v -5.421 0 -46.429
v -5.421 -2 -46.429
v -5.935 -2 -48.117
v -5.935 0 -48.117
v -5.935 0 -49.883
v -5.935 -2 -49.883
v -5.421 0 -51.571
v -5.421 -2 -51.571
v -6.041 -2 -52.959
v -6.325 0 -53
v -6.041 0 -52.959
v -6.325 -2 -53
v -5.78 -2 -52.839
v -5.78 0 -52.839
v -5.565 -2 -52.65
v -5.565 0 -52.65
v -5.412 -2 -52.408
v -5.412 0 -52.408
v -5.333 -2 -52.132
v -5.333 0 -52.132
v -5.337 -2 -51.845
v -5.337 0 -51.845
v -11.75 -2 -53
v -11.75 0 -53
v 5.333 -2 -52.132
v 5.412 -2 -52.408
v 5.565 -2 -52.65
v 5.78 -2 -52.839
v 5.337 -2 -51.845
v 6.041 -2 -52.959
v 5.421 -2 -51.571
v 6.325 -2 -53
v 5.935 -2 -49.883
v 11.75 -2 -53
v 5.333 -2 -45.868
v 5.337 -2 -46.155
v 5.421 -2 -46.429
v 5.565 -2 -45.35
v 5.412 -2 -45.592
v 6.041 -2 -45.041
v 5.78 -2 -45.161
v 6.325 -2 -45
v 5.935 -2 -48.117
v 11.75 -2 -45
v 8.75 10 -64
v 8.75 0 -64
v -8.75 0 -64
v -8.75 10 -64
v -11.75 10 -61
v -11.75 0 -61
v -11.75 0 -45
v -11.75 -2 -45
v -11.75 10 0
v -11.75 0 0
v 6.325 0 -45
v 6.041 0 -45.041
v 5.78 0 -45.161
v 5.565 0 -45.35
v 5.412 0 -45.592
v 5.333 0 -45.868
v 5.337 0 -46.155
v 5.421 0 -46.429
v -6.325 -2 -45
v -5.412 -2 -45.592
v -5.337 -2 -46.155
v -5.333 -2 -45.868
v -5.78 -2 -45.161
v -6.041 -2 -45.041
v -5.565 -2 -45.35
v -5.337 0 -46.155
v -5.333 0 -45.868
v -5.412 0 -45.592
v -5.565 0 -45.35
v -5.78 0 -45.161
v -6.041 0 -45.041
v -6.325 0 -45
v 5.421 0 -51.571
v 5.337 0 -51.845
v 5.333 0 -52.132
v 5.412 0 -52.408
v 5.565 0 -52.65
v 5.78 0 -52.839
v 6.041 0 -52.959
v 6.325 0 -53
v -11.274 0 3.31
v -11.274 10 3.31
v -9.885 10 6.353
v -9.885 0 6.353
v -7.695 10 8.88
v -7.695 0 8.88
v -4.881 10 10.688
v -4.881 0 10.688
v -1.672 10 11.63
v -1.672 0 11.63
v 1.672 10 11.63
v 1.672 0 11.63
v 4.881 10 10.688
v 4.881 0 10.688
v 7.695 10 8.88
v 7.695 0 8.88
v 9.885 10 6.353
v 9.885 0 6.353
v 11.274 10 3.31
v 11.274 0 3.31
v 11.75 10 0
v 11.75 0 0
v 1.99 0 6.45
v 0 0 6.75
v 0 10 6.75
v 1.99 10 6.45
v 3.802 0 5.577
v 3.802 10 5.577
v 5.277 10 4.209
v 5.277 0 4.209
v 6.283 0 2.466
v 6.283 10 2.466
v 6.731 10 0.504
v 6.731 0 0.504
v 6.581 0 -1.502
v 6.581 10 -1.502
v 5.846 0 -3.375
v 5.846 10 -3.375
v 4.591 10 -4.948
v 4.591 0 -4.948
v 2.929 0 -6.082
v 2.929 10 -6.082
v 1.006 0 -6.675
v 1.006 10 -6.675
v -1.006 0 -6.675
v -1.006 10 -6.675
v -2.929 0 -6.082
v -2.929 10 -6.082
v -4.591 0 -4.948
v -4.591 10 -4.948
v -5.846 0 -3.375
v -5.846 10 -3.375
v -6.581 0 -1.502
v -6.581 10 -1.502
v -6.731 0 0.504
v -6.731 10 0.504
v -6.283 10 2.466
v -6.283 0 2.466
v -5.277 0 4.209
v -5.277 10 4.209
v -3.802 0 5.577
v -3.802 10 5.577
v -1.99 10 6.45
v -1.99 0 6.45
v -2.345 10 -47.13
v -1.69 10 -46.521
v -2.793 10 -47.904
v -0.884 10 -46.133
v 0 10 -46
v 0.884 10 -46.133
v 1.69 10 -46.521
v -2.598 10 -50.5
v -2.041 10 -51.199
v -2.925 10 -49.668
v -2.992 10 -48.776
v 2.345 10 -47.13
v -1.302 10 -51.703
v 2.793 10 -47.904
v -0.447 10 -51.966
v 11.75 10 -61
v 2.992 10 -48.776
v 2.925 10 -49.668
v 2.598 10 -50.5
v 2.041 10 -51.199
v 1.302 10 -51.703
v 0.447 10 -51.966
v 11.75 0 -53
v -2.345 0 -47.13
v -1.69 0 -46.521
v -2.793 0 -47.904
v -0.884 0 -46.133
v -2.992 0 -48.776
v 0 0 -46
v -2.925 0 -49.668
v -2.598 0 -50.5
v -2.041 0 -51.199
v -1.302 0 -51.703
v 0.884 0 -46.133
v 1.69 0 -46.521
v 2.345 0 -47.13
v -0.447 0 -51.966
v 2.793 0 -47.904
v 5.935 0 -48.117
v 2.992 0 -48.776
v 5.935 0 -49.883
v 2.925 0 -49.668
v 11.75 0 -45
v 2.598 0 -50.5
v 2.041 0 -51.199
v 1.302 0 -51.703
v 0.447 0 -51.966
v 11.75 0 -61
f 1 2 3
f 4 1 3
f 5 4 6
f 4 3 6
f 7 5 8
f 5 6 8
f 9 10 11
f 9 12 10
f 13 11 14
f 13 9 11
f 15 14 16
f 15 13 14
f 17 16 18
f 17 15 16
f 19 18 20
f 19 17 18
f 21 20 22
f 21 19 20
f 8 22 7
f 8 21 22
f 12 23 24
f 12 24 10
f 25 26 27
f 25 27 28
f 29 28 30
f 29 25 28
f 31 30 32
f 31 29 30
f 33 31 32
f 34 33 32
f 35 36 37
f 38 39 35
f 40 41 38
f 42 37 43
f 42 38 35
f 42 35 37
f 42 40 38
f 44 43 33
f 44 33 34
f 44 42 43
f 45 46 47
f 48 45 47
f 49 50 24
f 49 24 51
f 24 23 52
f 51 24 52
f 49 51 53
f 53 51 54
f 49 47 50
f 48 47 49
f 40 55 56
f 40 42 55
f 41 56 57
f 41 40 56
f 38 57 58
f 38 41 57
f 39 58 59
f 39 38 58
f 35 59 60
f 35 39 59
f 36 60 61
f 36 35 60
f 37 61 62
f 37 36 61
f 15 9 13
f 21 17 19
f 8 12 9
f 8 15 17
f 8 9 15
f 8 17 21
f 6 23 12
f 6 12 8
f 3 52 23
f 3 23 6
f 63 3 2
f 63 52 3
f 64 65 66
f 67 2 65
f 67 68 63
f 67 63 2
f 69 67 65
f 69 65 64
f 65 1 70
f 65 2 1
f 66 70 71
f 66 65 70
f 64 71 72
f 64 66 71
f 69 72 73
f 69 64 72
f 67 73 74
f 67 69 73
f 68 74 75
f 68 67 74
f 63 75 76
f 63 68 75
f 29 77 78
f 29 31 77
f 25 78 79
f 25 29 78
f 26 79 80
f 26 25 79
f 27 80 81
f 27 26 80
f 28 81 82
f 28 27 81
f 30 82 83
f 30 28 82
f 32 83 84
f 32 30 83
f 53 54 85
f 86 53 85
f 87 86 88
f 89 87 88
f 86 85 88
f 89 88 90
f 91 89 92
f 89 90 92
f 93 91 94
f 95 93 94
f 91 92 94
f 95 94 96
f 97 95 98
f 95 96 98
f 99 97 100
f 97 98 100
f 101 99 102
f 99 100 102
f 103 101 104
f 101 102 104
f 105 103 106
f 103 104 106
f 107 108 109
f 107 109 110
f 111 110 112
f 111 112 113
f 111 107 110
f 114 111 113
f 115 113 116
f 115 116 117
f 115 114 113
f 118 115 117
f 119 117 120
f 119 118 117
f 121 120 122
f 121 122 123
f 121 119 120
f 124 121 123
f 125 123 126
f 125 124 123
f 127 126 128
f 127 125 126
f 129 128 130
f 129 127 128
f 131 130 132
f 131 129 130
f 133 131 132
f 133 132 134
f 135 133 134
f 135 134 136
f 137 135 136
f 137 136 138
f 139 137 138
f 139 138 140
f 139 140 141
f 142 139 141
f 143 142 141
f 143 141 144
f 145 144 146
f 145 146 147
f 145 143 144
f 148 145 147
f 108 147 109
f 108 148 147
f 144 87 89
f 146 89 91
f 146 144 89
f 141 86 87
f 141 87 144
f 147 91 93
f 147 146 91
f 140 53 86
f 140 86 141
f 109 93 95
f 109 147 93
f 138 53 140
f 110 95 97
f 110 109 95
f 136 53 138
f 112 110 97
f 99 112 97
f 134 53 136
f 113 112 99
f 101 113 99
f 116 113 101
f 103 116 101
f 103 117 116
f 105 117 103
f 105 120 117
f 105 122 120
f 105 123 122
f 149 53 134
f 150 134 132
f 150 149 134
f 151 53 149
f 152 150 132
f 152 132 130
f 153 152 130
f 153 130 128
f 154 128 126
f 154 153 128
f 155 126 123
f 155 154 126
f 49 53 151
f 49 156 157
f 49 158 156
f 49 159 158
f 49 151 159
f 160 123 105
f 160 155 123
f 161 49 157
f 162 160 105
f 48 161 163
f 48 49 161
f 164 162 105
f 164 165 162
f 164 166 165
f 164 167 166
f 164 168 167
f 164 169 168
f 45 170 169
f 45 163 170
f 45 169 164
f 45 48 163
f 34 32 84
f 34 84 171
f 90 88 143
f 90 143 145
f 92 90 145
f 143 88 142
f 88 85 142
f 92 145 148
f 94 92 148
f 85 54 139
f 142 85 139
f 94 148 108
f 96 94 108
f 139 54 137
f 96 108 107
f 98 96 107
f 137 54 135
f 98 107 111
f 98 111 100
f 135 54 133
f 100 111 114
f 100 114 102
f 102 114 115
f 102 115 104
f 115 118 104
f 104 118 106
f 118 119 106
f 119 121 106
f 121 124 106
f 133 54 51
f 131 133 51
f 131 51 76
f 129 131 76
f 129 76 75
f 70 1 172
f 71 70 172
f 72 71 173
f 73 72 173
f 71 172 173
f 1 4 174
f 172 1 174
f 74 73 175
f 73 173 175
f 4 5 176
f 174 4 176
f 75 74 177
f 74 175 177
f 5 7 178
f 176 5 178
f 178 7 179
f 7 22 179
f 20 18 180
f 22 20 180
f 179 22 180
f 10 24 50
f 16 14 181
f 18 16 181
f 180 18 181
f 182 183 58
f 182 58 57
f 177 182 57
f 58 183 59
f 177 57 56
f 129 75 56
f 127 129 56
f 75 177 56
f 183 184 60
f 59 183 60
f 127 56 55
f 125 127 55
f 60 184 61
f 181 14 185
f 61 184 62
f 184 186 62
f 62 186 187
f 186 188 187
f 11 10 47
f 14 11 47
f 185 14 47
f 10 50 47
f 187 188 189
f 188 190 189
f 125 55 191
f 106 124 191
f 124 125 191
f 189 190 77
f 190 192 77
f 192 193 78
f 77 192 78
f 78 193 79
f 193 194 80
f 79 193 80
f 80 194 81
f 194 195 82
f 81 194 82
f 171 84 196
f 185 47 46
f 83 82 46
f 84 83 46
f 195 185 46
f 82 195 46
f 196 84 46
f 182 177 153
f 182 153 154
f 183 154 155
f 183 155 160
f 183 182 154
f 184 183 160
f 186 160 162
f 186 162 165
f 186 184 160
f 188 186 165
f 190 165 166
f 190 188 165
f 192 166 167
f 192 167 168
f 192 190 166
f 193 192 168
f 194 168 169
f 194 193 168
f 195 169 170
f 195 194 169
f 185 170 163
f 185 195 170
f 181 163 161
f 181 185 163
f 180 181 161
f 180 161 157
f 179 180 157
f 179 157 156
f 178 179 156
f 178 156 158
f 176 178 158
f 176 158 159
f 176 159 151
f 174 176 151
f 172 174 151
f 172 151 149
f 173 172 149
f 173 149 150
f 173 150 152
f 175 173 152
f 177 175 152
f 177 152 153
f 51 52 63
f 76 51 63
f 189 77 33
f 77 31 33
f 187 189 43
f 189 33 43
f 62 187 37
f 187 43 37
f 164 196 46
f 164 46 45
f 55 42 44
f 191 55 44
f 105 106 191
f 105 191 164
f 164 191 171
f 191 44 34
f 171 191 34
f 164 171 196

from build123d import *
from build123d.topology import SkipClean

# Parameters (mm, degrees)
SKETCH1_R           = 3
SKETCH1_R_2         = 6.75
BOSS_EXTRUDE1_DEPTH = 10
BOSS_EXTRUDE2_START = 2
SKETCH2_W           = 23.5
SKETCH2_H           = 8
SKETCH2_R           = 3
BOSS_EXTRUDE2_DEPTH = 2
CHAMFER1_SIZE       = 3
SKETCH3_R           = 6
CUT_EXTRUDE1_DEPTH  = 2
FILLET1_R           = 1


with BuildPart() as part:
    # Sketch1 → Boss-Extrude1 (new body)
    with BuildSketch(Plane(origin=(0, 0, 0), x_dir=(1, 0, 0), z_dir=(0, 1, 0))):
        with BuildLine():
            Line((-11.75, 64), (-11.75, 0))
            ThreePointArc((-11.75, 0), (0, -11.75), (11.75, 0))
            Line((11.75, 0), (11.75, 64))
            Line((11.75, 64), (-11.75, 64))
        make_face()
        with Locations(Location((0, 49, 0), (0, 0, 270))):
            Circle(SKETCH1_R, mode=Mode.SUBTRACT)
        with Locations(Location((0, 0, 0), (0, 0, 270))):
            Circle(SKETCH1_R_2, mode=Mode.SUBTRACT)
    extrude(amount=BOSS_EXTRUDE1_DEPTH)

    # Sketch2 → Boss-Extrude2 (add)
    with SkipClean():  # the faces are left unmerged after this step: merging them gives an invalid solid
        with BuildSketch(Plane.XZ.offset(BOSS_EXTRUDE2_START)):
            with Locations((0, -49)):
                Rectangle(SKETCH2_W, SKETCH2_H)
            with Locations(Location((0, -49, 0), (0, 0, 270))):
                Circle(SKETCH2_R, mode=Mode.SUBTRACT)
        extrude(amount=-BOSS_EXTRUDE2_DEPTH)

    # Chamfer1
    chamfer1_edges = [part.edges().sort_by_distance(p)[0] for p in [
        (-11.75, 5, -64),
        (11.75, 5, -64),
    ]]
    chamfer(chamfer1_edges, length=CHAMFER1_SIZE)

    # Sketch3 → Cut-Extrude1 (cut)
    with BuildSketch(Plane.XZ.offset(2)):
        with Locations((0, -49)):
            Circle(SKETCH3_R)
    extrude(amount=-CUT_EXTRUDE1_DEPTH, mode=Mode.SUBTRACT)

    # Fillet1
    fillet1_edges = [part.edges().sort_by_distance(p)[0] for p in [
        (4.472135955, -1, -53),
        (-4.472135955, -1, -53),
        (4.472135955, -1, -45),
        (-4.472135955, -1, -45),
    ]]
    fillet(fillet1_edges, radius=FILLET1_R)


solid = part.part
